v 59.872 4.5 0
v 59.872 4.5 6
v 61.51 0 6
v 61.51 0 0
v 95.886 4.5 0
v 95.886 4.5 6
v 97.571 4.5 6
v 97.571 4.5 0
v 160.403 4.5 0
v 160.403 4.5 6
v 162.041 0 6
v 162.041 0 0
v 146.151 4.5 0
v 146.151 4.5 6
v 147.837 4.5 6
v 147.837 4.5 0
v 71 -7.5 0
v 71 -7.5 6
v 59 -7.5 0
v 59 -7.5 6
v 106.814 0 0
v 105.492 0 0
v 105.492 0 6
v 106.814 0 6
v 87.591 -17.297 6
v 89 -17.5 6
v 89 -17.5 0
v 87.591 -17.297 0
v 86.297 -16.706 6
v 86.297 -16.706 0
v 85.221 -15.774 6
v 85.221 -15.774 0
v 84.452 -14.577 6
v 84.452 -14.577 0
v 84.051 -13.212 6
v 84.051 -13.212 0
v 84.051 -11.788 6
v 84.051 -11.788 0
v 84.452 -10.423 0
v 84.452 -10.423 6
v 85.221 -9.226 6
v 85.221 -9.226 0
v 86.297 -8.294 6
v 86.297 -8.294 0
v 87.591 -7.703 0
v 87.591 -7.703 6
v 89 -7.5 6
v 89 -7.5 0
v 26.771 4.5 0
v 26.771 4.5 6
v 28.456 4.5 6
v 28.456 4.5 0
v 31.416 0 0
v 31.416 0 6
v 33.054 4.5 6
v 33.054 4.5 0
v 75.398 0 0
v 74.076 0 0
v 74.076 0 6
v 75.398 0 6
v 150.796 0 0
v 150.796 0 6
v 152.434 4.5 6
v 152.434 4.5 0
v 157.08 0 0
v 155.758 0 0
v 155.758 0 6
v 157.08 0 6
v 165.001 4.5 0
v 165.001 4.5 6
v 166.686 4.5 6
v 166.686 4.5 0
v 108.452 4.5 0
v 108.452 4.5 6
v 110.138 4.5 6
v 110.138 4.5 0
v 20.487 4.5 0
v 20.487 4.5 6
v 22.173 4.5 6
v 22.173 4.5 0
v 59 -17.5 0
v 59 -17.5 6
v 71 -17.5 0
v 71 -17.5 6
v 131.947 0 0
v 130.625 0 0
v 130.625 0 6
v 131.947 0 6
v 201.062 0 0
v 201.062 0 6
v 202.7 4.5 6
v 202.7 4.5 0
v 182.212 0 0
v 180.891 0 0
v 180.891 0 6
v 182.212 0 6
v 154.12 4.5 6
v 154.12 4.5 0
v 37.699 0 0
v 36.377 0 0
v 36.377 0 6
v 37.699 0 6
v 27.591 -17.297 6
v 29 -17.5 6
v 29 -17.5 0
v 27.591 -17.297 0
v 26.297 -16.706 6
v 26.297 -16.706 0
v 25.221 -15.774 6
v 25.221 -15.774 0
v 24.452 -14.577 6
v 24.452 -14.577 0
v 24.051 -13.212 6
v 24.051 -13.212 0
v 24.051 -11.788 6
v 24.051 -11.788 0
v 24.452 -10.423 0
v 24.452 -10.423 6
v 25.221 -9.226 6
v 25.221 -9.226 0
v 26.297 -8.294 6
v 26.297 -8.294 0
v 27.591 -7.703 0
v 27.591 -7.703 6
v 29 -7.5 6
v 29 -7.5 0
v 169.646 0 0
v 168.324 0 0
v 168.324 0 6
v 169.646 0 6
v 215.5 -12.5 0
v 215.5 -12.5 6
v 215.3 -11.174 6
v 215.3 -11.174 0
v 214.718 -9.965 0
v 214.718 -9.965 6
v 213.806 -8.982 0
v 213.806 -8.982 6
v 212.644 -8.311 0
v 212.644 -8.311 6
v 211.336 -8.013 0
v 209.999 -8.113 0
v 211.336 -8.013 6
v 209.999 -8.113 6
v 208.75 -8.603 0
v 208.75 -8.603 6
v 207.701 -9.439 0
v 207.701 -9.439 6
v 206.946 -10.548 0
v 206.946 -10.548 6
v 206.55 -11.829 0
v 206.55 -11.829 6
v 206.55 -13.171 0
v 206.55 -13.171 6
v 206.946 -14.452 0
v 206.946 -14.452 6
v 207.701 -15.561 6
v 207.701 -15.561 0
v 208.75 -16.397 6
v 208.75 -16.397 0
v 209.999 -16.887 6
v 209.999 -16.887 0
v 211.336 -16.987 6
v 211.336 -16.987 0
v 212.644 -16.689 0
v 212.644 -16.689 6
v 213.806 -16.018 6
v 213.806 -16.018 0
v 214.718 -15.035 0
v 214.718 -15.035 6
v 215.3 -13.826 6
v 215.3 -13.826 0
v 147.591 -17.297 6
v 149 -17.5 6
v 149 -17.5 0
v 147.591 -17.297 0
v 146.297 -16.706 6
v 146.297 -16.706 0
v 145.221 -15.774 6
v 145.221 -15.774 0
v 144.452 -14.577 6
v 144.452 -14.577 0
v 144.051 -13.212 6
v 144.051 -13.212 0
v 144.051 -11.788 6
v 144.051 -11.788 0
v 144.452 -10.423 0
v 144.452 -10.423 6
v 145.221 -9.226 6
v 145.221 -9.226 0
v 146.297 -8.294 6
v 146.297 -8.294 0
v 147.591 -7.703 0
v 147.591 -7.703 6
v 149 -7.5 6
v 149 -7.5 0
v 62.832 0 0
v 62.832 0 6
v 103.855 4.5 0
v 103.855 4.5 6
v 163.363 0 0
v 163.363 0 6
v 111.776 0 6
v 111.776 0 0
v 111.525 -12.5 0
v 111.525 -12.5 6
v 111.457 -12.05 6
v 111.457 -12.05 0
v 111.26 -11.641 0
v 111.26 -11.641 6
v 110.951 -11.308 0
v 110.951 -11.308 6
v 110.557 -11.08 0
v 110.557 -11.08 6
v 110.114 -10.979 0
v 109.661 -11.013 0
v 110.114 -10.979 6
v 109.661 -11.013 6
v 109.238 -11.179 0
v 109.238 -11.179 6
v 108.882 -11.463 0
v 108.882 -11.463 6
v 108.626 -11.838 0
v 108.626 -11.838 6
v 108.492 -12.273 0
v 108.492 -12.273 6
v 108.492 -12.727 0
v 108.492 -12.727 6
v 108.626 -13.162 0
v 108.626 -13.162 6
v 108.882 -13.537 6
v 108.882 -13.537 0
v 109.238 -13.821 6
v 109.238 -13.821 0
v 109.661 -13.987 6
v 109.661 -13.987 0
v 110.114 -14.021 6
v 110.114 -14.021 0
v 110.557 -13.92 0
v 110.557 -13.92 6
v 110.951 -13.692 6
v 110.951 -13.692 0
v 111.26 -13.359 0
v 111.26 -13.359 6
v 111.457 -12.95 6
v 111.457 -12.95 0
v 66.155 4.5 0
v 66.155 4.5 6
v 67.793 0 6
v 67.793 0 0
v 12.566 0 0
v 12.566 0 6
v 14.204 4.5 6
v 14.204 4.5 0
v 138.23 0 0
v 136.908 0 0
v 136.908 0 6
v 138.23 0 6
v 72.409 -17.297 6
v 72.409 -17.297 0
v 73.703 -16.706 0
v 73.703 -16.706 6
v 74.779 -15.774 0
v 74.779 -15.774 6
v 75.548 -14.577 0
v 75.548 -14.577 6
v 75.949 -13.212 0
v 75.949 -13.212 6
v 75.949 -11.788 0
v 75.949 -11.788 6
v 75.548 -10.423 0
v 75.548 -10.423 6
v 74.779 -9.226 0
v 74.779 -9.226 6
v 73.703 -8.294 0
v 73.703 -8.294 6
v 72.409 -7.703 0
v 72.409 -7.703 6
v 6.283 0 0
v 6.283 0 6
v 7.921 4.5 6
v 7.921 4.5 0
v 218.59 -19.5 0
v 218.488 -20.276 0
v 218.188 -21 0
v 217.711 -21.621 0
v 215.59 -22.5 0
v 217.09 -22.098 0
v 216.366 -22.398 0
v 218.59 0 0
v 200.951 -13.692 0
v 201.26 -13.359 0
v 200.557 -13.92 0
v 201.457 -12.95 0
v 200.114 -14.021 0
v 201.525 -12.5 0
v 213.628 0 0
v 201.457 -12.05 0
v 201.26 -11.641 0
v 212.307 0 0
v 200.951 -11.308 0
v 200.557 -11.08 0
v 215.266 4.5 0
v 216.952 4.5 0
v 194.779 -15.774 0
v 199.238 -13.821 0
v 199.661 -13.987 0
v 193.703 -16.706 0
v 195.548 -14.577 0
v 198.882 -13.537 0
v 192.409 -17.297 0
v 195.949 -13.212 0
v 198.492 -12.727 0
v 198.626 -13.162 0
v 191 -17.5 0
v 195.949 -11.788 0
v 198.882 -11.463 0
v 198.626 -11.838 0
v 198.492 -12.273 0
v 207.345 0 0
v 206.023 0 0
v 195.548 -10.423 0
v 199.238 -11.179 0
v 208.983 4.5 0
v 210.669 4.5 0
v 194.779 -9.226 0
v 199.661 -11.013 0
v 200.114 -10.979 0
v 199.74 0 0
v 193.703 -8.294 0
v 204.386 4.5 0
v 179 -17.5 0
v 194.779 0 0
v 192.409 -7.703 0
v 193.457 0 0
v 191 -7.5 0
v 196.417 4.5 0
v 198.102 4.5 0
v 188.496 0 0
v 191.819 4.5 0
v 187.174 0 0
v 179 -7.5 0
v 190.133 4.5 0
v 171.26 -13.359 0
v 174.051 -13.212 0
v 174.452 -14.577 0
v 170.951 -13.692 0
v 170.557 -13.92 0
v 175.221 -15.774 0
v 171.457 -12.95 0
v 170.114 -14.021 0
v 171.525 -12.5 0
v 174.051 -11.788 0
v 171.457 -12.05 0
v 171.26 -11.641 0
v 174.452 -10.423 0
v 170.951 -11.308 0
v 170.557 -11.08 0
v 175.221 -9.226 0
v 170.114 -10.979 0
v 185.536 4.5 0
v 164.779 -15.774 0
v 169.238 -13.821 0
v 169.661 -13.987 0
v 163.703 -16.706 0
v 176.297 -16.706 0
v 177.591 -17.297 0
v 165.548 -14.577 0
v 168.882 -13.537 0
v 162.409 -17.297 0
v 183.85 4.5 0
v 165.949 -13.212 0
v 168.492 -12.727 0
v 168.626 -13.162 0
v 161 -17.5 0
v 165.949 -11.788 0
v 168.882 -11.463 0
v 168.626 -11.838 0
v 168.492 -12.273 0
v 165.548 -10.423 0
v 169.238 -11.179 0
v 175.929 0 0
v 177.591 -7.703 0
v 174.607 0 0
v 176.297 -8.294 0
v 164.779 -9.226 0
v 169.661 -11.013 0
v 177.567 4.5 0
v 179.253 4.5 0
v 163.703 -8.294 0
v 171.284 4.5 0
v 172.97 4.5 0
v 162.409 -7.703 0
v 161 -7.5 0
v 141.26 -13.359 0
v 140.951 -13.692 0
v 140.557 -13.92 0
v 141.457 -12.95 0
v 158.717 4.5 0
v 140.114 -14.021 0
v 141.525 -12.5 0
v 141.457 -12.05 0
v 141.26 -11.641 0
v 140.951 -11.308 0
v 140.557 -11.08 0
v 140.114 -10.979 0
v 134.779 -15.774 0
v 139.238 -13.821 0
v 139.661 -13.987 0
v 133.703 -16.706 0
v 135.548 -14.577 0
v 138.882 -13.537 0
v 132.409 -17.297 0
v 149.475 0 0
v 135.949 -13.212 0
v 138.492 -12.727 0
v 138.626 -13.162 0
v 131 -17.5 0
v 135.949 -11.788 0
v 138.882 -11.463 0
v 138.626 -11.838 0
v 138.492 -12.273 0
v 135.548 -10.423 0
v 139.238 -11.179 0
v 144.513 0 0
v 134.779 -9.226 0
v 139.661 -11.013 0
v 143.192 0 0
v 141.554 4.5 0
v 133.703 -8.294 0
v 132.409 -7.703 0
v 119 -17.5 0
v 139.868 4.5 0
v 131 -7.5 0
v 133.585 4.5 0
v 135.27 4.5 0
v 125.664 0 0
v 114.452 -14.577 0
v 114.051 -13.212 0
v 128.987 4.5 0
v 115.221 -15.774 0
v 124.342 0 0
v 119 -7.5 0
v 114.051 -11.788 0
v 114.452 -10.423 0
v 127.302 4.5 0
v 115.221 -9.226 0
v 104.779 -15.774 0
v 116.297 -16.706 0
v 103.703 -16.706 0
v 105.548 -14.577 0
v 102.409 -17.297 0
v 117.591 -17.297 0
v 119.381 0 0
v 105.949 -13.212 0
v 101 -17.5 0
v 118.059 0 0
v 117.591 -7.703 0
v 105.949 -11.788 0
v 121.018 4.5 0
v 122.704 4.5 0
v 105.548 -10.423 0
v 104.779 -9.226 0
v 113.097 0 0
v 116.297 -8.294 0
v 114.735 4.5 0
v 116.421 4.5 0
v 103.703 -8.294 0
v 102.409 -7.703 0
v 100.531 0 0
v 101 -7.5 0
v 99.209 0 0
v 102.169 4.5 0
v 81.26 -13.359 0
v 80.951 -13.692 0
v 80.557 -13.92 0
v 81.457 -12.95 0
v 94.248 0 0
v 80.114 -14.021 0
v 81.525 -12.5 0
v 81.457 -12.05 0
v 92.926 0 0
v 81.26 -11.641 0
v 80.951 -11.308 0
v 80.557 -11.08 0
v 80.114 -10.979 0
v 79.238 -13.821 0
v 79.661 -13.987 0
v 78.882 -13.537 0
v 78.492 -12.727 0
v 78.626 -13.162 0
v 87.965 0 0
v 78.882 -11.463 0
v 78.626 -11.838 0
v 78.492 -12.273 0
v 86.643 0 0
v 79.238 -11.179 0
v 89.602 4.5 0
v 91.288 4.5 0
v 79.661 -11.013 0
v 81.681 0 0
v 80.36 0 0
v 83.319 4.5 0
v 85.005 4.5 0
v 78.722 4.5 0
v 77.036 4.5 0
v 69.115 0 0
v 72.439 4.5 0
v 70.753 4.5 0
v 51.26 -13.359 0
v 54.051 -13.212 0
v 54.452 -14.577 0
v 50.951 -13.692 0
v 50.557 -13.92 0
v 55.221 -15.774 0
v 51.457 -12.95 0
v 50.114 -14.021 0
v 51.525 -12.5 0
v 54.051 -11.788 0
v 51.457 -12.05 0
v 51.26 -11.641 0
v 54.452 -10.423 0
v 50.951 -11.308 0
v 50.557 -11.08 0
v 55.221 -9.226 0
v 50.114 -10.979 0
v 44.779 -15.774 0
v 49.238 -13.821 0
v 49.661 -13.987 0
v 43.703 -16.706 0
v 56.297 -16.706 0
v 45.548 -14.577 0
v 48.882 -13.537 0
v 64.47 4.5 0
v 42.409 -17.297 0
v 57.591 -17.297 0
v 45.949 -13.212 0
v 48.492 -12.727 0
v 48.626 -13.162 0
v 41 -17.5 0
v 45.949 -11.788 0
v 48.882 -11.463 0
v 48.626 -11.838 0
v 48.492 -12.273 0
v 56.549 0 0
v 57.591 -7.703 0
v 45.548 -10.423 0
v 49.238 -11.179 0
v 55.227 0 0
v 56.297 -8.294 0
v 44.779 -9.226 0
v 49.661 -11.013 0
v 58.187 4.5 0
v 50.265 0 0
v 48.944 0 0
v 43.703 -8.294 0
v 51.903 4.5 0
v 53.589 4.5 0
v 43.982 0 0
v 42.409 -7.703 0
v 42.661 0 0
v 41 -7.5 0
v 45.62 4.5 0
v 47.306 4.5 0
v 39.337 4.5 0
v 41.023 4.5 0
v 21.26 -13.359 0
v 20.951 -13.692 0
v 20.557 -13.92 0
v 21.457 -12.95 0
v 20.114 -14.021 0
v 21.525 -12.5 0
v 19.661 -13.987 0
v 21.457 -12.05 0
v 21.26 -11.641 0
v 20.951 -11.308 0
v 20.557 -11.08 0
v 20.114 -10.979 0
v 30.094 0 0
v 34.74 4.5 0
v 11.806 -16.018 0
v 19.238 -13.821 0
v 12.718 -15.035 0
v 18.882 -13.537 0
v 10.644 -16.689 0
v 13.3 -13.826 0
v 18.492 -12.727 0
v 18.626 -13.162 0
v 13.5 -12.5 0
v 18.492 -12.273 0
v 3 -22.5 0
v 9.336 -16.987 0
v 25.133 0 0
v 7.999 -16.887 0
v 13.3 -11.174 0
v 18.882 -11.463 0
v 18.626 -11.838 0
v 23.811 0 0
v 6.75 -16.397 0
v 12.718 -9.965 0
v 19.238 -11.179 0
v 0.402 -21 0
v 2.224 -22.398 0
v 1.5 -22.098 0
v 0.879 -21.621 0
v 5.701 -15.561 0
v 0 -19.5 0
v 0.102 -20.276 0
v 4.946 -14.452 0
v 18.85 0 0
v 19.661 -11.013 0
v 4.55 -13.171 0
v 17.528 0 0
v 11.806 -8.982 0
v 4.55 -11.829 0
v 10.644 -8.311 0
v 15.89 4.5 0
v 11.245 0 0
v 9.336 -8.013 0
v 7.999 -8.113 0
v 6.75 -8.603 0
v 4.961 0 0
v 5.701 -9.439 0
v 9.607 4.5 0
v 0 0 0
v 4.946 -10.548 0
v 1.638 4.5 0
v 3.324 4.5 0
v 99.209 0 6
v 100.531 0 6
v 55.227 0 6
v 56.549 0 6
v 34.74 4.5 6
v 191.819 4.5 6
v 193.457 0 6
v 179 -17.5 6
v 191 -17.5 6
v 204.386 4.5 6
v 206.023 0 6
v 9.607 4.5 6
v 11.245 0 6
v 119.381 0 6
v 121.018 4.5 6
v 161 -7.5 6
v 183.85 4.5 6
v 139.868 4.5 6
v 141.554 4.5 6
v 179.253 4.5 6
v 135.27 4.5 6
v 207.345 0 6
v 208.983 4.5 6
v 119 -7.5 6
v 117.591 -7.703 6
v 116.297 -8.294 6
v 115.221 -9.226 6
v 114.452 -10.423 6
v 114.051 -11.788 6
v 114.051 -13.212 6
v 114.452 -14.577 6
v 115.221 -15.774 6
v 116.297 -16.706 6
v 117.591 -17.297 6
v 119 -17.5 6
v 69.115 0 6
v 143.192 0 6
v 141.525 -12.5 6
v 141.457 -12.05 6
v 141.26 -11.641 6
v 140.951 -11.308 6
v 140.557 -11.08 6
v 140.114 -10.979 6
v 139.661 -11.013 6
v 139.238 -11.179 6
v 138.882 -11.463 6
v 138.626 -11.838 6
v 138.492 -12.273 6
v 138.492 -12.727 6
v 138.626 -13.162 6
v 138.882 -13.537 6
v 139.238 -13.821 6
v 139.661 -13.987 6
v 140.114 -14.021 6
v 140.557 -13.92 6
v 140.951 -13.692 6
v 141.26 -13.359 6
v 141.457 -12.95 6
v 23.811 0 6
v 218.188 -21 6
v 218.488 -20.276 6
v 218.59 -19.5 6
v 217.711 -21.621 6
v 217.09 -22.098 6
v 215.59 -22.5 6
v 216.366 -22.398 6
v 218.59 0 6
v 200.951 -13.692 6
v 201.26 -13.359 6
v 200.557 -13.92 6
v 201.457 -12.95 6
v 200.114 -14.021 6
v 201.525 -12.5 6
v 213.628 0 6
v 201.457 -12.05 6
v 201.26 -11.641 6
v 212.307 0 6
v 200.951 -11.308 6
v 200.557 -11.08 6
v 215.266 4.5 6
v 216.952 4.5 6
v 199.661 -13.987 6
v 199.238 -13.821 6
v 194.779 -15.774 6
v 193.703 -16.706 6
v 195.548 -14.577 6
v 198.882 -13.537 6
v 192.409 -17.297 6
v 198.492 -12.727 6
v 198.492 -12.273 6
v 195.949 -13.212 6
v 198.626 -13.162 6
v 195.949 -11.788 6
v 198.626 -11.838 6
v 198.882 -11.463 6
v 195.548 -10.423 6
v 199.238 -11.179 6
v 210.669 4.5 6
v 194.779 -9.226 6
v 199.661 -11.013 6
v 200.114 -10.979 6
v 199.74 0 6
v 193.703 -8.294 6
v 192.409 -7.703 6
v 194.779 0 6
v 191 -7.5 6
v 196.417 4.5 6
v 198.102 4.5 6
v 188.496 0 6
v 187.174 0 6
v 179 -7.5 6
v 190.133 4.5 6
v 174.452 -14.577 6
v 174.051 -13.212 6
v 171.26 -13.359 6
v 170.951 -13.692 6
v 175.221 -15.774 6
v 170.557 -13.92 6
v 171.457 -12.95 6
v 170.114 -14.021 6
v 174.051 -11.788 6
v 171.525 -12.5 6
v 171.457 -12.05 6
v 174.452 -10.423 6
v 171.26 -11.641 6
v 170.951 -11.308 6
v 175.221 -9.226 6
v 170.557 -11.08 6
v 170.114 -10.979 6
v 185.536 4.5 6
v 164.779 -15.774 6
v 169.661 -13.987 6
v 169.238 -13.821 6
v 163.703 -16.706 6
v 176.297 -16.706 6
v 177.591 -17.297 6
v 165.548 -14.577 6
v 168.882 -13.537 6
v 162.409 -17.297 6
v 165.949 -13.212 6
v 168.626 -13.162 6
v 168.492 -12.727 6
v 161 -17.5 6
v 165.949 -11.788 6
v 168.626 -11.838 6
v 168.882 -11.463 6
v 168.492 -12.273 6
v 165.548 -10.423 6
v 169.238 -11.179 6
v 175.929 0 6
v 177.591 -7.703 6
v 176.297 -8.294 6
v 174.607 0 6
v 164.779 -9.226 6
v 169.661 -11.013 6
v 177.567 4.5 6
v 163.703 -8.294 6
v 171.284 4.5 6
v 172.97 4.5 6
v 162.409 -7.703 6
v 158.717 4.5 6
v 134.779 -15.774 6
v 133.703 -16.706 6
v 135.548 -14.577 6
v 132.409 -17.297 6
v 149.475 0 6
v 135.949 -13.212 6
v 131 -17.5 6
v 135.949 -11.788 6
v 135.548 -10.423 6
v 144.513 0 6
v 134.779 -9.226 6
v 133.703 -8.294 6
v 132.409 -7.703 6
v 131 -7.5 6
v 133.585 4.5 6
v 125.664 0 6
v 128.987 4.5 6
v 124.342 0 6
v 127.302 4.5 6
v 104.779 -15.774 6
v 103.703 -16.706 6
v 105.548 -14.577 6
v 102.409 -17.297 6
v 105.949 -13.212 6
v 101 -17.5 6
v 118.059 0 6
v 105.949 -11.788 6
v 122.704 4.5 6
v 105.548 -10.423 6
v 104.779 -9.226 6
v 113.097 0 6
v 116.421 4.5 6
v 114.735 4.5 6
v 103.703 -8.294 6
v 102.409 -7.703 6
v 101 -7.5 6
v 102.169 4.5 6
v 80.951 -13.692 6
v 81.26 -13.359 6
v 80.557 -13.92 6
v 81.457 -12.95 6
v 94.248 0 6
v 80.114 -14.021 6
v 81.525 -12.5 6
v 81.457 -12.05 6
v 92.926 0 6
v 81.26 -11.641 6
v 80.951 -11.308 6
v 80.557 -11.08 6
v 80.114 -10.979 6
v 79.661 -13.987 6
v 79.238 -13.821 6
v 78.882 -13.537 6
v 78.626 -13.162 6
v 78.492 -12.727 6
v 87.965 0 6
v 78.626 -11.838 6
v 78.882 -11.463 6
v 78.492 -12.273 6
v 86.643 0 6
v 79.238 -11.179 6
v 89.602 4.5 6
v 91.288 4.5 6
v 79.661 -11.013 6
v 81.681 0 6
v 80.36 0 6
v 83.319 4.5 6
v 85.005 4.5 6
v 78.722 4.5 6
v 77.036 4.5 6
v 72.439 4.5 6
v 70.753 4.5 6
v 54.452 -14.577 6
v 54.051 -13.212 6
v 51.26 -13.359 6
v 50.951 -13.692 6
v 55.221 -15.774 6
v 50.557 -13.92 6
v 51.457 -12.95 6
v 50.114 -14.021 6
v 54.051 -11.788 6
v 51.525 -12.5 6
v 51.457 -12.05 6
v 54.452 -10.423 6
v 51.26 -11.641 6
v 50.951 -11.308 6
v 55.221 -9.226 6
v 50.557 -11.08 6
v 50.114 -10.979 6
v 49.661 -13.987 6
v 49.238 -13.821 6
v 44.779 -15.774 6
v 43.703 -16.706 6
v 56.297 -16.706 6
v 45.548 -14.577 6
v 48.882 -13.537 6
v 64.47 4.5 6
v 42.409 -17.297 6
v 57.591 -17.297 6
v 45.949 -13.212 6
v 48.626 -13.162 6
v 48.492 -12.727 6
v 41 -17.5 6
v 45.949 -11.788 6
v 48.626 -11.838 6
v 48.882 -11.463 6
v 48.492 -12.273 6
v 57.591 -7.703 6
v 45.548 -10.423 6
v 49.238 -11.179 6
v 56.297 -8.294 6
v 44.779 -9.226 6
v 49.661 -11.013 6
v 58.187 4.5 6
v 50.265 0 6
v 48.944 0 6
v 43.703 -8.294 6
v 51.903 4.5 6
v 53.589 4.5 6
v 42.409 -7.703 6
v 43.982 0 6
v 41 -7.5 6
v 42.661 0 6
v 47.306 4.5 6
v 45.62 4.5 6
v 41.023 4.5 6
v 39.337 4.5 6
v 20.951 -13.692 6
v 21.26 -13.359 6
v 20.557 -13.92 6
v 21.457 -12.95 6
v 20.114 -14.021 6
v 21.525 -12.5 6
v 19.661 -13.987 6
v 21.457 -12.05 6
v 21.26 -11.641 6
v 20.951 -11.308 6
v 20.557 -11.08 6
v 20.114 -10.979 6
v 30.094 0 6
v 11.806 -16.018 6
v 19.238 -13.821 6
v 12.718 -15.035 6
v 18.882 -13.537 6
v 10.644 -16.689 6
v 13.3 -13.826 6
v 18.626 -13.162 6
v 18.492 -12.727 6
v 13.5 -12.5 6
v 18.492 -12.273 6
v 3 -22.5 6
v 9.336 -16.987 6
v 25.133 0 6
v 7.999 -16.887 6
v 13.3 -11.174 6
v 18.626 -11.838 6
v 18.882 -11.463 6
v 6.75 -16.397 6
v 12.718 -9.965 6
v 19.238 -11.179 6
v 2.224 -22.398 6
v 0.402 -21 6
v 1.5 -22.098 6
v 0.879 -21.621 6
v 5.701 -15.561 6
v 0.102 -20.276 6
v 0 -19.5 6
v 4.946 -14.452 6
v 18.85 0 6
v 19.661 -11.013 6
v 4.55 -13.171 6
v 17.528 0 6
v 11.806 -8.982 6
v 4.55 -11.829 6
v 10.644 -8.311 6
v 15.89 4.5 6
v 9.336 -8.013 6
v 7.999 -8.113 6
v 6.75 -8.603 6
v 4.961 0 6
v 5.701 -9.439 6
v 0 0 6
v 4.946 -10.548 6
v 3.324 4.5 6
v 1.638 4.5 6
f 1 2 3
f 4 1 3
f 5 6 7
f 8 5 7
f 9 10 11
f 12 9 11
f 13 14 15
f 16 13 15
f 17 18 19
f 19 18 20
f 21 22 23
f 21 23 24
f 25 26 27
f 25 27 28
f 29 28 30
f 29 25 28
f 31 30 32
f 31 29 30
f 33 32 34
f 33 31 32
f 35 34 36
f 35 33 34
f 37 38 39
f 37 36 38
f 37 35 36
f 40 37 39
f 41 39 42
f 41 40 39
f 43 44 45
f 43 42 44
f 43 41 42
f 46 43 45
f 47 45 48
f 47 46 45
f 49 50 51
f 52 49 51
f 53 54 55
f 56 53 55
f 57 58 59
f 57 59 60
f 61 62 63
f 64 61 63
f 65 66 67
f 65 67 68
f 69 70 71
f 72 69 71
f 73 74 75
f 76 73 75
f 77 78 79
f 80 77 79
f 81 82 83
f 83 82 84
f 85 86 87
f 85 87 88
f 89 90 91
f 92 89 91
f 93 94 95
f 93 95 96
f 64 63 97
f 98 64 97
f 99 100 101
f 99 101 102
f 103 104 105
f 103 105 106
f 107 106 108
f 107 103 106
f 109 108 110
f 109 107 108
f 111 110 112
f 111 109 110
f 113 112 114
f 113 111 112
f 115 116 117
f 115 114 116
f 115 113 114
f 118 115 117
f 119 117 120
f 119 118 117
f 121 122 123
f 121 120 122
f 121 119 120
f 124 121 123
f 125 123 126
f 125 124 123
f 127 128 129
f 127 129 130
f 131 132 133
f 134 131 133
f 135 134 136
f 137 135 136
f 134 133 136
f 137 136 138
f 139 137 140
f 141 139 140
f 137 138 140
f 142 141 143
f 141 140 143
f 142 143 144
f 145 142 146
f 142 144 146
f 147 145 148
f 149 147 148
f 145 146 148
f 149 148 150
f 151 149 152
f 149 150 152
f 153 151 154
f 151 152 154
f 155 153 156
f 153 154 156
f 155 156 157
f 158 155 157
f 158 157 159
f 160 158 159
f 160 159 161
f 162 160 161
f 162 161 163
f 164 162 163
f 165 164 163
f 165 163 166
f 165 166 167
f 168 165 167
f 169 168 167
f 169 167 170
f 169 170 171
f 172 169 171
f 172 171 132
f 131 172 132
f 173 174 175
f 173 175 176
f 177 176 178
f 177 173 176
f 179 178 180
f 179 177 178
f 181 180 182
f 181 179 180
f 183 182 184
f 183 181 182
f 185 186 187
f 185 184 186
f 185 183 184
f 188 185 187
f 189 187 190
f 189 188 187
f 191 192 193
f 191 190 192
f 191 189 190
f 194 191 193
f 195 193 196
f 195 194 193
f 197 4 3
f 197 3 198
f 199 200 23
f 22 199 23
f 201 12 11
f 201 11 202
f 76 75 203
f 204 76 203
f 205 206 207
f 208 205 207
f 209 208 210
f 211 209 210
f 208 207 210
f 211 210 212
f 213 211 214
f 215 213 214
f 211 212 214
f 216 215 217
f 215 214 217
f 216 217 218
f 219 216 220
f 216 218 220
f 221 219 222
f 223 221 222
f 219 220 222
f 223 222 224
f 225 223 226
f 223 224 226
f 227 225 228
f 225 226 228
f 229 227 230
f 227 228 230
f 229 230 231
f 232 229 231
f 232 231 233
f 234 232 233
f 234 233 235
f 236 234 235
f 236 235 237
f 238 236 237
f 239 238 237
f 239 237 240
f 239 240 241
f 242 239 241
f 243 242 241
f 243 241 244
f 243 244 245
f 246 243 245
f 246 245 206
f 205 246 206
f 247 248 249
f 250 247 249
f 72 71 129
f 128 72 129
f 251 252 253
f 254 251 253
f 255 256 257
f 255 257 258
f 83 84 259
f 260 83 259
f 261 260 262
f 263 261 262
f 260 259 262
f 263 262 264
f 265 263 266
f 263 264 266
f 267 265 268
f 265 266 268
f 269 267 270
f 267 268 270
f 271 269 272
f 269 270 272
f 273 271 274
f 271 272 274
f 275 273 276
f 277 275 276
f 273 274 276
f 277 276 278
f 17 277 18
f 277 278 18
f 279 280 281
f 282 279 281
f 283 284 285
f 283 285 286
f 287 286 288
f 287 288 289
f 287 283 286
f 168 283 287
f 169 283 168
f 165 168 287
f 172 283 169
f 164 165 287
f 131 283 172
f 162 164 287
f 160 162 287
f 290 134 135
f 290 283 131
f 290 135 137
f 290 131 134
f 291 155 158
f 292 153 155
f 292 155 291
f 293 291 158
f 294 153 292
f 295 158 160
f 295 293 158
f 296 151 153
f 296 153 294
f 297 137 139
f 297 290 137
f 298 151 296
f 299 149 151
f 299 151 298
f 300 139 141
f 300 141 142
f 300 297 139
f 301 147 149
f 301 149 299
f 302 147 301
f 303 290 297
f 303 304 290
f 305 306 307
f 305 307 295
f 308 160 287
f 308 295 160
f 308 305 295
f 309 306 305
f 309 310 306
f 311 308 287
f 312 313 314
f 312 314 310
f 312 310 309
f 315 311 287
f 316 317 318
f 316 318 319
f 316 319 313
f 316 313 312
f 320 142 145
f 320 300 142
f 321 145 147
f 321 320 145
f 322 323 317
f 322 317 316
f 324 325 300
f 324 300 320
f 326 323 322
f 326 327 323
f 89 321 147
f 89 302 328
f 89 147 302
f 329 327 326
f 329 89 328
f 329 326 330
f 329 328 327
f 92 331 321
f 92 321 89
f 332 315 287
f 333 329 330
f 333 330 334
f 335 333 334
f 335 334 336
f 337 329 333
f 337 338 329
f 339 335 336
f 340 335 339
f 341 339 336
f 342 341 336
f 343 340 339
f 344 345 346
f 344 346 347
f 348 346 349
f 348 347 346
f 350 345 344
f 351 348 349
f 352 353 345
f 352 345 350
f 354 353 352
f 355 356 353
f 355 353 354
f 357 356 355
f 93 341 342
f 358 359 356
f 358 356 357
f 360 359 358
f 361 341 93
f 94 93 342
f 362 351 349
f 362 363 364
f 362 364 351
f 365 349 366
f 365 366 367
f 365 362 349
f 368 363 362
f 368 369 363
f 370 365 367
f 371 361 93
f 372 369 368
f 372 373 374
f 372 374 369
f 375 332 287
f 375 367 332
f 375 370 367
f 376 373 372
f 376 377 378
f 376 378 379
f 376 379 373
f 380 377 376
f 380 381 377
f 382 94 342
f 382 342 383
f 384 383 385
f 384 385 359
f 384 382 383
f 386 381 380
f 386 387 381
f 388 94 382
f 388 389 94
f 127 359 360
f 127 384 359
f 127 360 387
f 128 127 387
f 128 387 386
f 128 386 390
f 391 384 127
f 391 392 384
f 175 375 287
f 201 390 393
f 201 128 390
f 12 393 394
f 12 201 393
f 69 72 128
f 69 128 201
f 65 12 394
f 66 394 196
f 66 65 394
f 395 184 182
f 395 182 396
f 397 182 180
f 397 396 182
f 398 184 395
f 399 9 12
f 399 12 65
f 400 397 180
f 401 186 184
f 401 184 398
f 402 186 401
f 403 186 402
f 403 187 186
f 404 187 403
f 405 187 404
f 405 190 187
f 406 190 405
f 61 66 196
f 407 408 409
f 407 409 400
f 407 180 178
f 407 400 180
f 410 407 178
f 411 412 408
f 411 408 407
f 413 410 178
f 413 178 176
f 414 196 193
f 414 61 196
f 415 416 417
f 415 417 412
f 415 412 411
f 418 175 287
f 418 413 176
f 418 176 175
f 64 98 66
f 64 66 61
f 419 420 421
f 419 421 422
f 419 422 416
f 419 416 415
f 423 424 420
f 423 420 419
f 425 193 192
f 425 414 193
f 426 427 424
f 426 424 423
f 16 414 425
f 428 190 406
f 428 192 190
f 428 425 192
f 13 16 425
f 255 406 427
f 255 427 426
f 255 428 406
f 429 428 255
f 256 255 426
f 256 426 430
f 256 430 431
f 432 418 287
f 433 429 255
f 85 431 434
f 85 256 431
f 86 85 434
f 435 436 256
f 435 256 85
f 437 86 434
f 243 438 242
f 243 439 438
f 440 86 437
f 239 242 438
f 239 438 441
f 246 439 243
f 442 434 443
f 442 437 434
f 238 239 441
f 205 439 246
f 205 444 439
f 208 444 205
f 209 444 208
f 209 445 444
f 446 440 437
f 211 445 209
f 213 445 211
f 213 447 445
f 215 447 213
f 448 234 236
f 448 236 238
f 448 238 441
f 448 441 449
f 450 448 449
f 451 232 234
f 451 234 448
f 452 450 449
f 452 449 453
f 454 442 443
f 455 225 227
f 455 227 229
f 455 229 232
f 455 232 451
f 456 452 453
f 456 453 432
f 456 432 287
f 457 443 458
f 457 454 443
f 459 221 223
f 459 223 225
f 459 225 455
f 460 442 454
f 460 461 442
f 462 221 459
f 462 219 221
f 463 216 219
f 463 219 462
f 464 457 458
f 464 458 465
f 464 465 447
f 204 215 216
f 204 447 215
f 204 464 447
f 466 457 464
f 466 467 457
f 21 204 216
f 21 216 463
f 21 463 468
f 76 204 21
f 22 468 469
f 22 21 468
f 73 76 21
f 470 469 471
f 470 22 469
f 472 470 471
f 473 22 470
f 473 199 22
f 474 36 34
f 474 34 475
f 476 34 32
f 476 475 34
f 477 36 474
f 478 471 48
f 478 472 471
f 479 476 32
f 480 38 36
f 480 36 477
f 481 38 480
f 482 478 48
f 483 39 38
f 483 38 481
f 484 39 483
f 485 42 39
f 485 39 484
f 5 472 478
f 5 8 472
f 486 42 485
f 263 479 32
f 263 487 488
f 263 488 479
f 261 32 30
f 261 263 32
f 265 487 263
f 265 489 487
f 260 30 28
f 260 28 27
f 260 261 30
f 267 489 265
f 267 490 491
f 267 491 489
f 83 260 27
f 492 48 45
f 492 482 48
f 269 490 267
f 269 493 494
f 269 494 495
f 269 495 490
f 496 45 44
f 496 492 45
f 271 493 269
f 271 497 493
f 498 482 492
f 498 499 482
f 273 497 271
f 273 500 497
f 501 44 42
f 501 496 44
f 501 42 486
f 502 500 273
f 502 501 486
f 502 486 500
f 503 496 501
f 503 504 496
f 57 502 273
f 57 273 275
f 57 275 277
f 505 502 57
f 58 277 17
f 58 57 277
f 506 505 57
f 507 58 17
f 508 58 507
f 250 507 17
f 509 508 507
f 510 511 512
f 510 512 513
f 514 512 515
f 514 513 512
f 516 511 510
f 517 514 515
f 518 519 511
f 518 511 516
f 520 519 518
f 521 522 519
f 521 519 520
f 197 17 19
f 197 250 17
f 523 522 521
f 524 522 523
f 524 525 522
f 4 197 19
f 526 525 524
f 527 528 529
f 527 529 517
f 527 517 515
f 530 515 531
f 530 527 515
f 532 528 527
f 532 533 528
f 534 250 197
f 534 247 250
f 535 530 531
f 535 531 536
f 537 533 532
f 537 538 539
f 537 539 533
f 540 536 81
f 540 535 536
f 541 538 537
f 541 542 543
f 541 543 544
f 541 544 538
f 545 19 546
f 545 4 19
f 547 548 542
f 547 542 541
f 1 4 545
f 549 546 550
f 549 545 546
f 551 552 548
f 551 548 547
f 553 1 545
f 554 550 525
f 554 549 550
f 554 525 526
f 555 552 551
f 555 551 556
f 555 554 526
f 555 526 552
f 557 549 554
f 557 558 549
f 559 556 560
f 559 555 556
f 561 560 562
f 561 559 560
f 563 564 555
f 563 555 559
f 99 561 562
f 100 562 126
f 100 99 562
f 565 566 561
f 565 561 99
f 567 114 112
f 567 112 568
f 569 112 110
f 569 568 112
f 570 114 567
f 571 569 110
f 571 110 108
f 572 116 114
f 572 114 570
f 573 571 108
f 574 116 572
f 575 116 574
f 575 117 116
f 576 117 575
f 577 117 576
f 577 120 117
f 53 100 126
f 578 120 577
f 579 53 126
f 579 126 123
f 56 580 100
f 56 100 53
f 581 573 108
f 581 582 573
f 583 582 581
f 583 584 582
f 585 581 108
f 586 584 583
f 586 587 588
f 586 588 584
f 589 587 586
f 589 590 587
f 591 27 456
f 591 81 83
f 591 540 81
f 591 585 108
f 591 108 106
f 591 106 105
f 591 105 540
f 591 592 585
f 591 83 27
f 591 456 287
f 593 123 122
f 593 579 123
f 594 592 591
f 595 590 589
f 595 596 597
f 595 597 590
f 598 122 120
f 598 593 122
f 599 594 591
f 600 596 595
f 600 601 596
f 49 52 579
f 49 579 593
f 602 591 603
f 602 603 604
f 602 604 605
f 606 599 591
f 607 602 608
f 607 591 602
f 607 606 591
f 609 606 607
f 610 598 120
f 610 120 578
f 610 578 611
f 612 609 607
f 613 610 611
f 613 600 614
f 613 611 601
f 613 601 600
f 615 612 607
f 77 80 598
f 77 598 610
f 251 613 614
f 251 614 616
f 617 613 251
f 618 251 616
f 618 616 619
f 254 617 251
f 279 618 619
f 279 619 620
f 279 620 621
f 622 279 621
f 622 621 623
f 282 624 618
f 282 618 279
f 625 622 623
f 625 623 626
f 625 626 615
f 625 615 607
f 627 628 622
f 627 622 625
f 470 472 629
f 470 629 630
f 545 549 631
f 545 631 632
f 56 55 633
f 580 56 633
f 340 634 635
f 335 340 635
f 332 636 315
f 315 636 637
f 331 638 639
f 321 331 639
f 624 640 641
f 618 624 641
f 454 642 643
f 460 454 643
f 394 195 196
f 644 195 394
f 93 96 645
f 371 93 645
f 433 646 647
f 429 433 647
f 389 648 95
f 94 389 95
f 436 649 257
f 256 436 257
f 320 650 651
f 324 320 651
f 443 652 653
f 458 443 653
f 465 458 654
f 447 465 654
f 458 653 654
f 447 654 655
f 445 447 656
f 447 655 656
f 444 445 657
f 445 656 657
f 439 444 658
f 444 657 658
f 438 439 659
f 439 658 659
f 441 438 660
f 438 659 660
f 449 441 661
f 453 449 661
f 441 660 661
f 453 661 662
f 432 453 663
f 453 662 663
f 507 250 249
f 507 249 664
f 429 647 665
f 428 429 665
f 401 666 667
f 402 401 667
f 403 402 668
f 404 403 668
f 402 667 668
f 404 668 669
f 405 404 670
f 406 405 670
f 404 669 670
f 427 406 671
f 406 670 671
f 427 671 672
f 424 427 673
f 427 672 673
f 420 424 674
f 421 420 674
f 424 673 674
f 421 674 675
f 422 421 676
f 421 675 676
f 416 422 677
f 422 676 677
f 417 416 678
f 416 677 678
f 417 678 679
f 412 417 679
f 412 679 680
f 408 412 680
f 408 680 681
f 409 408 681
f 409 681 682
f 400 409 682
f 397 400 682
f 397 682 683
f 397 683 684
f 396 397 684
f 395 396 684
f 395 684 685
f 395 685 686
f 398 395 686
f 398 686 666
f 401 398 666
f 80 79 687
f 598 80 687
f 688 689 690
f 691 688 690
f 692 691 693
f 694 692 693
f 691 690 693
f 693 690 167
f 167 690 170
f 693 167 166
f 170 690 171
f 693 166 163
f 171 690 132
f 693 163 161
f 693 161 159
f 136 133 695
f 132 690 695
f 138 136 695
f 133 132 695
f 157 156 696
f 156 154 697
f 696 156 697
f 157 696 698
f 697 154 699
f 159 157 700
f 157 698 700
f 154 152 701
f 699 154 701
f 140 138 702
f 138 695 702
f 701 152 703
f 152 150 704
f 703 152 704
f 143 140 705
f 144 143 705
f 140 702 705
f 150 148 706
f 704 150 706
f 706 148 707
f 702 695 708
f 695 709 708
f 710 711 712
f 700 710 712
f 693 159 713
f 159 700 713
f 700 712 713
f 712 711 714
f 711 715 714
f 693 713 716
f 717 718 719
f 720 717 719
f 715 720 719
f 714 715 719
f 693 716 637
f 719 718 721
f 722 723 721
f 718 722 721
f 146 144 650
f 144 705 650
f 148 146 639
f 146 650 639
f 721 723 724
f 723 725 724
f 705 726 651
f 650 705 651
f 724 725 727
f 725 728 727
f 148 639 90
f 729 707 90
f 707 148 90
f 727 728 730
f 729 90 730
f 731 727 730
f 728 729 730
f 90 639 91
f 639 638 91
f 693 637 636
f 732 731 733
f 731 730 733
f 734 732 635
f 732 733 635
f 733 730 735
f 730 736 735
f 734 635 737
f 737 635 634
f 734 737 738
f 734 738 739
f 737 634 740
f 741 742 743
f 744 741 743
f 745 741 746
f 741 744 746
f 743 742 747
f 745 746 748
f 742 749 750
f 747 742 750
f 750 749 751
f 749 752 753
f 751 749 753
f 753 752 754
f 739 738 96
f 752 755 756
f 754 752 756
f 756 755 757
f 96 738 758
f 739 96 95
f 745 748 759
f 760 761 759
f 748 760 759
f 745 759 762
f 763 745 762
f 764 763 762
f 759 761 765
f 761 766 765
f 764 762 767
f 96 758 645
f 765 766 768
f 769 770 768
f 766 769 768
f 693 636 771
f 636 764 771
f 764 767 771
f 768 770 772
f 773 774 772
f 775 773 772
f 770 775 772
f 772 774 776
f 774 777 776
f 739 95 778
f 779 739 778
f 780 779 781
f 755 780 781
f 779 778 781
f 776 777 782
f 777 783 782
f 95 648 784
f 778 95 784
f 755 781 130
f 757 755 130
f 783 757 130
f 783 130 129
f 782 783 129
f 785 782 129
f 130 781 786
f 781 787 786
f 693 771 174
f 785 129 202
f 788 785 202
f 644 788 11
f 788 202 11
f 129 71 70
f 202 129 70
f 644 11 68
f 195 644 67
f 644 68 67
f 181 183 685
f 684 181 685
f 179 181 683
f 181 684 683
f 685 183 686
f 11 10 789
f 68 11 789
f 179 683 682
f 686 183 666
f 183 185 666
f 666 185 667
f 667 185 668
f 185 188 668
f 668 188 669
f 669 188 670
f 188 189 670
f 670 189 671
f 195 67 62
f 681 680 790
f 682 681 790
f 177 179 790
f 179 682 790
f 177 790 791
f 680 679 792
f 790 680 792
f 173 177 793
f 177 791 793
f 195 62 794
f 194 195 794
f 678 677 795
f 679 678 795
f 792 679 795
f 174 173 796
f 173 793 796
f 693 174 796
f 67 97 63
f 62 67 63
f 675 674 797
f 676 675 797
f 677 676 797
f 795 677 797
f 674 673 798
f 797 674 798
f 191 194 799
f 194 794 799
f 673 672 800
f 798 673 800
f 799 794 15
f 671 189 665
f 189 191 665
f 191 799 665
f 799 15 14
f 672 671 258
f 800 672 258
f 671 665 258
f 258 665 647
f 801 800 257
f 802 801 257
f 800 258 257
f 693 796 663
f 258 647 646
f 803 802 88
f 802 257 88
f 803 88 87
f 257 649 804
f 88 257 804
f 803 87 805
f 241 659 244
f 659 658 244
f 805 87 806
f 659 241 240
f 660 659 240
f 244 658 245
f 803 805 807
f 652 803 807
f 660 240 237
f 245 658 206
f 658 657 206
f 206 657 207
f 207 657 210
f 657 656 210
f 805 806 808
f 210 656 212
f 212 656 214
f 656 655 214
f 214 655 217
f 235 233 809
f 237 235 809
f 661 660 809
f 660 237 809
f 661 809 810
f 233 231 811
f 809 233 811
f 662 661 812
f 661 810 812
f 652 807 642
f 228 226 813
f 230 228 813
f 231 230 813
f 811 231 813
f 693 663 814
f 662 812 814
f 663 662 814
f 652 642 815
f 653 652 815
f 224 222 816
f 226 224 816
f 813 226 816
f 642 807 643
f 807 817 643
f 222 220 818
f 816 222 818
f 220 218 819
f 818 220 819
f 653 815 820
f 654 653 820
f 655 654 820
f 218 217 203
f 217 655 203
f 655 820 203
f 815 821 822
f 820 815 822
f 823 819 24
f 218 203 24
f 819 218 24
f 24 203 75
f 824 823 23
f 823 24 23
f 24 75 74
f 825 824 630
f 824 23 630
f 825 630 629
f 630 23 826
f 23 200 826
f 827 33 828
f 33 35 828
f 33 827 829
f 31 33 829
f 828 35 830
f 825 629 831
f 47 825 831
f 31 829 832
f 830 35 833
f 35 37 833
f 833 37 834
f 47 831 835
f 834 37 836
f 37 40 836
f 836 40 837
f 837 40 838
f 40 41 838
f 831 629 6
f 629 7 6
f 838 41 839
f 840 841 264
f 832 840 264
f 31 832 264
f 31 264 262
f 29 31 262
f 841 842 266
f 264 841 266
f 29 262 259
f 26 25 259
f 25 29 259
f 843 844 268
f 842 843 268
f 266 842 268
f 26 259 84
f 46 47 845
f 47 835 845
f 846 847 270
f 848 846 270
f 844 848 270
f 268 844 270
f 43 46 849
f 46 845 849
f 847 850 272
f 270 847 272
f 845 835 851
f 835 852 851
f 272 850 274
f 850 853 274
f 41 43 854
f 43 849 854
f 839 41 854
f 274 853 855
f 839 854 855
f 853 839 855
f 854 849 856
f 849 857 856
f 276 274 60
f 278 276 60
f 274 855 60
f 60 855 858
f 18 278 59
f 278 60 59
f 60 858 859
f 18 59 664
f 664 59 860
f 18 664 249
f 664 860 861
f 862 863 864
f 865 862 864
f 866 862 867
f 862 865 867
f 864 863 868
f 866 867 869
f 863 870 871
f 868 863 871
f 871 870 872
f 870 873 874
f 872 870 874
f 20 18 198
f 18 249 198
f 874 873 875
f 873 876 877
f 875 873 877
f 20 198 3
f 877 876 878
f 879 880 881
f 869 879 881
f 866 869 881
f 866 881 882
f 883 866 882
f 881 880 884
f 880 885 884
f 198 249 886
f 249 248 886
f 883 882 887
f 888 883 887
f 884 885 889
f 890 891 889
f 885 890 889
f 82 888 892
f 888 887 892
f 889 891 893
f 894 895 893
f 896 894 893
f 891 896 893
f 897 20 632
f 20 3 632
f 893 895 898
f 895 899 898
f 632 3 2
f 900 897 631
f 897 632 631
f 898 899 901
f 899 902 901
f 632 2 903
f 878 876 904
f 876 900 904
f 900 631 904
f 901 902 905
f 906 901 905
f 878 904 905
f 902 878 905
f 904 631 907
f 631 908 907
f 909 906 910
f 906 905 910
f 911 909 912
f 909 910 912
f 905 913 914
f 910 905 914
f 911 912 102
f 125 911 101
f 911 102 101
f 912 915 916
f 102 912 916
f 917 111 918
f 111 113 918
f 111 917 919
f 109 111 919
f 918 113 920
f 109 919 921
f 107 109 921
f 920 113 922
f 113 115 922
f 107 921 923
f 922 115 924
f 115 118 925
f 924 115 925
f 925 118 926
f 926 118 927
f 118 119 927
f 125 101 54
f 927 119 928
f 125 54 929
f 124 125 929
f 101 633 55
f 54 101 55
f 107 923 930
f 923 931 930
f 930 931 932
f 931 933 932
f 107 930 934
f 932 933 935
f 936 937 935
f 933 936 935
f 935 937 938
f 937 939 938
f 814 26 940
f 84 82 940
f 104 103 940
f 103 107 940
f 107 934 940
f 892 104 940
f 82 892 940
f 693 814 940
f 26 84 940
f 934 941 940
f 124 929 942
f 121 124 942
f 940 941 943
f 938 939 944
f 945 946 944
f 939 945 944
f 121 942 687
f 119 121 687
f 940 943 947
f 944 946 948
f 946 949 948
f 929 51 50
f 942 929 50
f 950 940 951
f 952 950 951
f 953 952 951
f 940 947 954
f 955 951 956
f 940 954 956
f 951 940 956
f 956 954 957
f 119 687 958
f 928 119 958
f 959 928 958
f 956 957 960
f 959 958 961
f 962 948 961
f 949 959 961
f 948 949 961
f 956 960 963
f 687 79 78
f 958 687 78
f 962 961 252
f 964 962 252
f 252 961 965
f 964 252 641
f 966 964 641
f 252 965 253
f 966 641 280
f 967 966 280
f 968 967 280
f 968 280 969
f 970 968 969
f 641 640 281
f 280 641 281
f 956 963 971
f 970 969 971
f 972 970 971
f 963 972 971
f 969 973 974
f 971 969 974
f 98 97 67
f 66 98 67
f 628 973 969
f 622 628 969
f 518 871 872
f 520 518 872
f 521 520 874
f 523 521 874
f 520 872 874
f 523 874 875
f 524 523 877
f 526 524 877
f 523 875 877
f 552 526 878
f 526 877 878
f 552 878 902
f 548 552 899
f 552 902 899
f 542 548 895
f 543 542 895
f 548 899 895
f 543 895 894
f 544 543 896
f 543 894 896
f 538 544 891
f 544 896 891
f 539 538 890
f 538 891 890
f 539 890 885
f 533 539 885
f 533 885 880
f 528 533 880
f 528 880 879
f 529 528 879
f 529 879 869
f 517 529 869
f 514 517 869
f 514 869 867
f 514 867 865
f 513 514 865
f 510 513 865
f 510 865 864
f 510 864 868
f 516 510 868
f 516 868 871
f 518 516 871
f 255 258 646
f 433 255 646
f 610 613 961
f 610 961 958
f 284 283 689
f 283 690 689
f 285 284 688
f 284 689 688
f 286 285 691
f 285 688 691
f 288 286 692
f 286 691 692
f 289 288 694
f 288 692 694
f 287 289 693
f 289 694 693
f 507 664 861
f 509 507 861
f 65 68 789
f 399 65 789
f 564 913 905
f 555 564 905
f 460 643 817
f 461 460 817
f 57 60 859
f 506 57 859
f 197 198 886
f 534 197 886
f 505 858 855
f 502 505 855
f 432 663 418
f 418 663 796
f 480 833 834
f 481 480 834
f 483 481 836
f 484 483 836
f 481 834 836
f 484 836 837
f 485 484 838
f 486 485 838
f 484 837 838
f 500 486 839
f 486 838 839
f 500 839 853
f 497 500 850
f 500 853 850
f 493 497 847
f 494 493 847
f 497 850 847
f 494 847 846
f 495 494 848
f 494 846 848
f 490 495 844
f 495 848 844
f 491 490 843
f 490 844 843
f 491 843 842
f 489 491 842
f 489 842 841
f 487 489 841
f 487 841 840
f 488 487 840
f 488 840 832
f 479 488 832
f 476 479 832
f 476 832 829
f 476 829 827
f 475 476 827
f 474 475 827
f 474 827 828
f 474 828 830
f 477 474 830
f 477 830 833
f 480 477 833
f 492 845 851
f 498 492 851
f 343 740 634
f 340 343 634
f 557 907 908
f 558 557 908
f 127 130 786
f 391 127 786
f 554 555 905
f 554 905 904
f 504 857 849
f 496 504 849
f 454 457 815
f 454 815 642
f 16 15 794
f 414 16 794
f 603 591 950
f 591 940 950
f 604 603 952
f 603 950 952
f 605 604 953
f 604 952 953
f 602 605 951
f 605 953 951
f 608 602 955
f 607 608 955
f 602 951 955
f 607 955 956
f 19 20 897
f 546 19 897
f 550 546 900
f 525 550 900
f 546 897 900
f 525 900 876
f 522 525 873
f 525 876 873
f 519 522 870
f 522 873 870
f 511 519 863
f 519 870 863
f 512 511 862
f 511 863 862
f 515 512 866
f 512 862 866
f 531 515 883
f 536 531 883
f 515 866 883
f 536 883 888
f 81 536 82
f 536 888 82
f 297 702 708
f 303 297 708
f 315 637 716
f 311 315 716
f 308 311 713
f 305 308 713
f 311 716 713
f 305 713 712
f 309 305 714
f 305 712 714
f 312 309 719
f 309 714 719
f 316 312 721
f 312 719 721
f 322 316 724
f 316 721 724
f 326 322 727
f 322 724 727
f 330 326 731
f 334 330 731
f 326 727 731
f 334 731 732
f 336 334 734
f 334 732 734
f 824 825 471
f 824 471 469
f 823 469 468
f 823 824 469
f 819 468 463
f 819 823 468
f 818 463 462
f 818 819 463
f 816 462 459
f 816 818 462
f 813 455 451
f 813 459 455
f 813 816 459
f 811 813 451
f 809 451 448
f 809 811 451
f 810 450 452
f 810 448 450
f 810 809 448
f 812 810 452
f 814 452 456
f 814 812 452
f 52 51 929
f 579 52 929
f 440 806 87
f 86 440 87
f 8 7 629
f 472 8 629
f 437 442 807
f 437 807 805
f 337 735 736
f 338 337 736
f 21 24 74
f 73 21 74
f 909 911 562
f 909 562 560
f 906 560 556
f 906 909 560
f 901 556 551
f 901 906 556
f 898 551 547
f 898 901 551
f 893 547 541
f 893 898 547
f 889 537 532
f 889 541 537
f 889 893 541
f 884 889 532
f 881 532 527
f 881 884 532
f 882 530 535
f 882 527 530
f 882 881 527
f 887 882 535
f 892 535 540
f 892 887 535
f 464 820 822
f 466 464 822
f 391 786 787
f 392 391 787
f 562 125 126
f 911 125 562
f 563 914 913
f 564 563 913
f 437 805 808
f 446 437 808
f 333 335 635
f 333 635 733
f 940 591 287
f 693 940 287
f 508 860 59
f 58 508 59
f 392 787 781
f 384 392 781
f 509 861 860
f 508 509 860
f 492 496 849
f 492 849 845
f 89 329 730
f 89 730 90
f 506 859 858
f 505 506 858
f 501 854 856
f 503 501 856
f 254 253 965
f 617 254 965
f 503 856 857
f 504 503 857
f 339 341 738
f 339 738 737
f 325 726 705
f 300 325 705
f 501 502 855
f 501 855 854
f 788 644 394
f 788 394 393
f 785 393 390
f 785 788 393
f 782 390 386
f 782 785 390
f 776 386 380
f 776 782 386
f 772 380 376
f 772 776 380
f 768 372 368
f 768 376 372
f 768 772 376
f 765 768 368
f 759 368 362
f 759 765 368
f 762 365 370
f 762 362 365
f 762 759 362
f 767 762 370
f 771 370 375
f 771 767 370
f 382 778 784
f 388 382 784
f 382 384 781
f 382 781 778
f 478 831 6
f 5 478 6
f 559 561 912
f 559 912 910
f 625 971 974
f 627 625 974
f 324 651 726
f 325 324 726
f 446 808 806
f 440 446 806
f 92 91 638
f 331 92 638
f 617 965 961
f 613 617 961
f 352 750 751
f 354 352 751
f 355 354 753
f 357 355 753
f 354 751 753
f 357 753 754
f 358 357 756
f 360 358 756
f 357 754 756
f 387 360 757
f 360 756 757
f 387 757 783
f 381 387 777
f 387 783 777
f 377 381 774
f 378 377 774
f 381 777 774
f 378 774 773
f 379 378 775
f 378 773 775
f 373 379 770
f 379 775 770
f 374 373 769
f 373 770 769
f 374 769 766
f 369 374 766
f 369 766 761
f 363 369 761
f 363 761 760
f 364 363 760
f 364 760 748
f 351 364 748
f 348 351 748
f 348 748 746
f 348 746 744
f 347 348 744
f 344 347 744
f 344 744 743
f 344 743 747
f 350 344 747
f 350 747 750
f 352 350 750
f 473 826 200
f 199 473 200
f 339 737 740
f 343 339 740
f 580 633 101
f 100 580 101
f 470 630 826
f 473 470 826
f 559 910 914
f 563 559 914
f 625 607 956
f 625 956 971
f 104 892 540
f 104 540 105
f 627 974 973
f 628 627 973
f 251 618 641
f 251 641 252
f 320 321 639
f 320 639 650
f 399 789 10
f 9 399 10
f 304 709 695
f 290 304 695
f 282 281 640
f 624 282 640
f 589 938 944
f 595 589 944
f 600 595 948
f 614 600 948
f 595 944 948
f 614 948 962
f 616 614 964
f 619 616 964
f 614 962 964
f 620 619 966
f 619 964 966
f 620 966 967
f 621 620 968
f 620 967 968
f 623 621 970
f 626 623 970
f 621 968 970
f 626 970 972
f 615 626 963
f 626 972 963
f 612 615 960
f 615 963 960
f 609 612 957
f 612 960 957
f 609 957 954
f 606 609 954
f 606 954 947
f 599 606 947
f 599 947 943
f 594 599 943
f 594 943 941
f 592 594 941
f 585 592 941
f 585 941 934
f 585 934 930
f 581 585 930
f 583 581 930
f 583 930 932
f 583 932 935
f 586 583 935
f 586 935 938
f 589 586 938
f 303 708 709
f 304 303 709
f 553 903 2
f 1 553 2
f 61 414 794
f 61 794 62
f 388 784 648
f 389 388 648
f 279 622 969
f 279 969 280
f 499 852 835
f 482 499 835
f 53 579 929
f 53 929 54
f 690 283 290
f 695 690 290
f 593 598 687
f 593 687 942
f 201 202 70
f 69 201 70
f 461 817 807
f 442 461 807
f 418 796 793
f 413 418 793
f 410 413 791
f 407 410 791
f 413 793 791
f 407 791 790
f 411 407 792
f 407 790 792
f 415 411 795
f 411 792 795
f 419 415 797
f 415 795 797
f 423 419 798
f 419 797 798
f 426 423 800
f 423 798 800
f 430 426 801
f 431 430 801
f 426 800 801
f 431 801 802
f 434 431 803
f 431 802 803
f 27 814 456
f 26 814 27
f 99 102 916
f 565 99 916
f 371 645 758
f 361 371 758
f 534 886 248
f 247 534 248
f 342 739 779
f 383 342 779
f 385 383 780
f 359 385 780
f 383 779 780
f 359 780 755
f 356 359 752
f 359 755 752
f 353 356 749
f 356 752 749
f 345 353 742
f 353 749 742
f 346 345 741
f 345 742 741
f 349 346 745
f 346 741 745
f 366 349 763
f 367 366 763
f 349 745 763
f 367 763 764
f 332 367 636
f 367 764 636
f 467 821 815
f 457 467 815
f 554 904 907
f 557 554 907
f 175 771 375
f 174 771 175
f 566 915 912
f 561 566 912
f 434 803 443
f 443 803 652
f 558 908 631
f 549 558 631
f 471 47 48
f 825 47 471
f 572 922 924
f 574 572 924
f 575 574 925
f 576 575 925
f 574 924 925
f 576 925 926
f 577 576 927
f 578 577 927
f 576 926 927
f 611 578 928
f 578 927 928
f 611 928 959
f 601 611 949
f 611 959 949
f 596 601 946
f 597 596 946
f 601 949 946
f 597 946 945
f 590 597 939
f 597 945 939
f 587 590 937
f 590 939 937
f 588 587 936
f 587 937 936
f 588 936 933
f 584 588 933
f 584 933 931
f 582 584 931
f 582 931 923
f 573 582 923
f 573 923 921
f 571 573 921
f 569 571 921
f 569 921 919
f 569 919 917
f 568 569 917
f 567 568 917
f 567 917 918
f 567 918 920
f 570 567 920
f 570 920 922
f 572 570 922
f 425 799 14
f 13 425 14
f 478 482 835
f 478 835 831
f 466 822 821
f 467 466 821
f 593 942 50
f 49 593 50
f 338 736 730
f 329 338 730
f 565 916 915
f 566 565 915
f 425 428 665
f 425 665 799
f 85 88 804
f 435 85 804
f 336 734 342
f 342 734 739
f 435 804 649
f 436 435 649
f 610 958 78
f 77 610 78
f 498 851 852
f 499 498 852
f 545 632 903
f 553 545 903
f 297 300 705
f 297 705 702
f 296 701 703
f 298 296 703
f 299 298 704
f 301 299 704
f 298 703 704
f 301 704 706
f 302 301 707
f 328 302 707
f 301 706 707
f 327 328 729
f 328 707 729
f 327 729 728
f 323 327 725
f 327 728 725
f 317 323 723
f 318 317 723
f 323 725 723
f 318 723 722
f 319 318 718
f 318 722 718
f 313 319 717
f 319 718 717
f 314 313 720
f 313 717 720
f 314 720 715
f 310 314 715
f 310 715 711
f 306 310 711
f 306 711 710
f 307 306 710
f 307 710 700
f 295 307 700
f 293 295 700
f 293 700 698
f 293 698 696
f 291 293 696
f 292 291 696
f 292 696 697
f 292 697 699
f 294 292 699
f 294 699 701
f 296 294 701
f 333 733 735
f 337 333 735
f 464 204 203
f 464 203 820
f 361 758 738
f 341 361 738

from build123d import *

# Parameters (mm, degrees)
SKETCH_1_W             = 218.58974427
SKETCH_1_H             = 22.5
EXTRUDE_1_DEPTH        = 6
EXTRUDE_2_DEPTH        = 6
PATTERN_LINEAR_1_COUNT = 35
PATTERN_LINEAR_1_PITCH = 6.283185307
SKETCH_3_R             = 1.525
CUT_EXTRUDE_1_DEPTH    = 10
PATTERN_LINEAR_2_COUNT = 7
PATTERN_LINEAR_2_PITCH = 30
FILLET_1_R             = 3
SKETCH_4_R             = 4.5
CUT_EXTRUDE_2_DEPTH    = 10


with BuildPart() as part:
    # 草图1 → 拉伸1 (new body)
    with BuildSketch(Plane.XY):
        with Locations((109.294872135, -11.25)):
            Rectangle(SKETCH_1_W, SKETCH_1_H)
    extrude(amount=EXTRUDE_1_DEPTH)

    # 草图2 → 拉伸2 (add)
    with BuildSketch(Plane.XY.offset(6)):
        Polygon((0, 0), (1.637866054, 4.5), (3.323577771, 4.5), (4.961443825, 0), align=None)
    extrude_2 = extrude(amount=-EXTRUDE_2_DEPTH)

    # 阵列(线性)1: 拉伸2 ×35
    with Locations(*[(i * PATTERN_LINEAR_1_PITCH, 0, 0) for i in range(1, PATTERN_LINEAR_1_COUNT)]):
        add(extrude_2)

    # 草图3 → 切除-拉伸1 (cut)
    with BuildSketch(Plane.XY.offset(6)):
        with Locations((20, -12.5)):
            Circle(SKETCH_3_R)
    cut_extrude_1 = extrude(amount=-CUT_EXTRUDE_1_DEPTH, mode=Mode.SUBTRACT)

    # 阵列(线性)2: 切除-拉伸1 ×7
    with Locations(*[(i * PATTERN_LINEAR_2_PITCH, 0, 0) for i in range(1, PATTERN_LINEAR_2_COUNT)]):
        add(cut_extrude_1, mode=Mode.SUBTRACT)

    # 圆角1
    fillet_1_edges = [part.edges().sort_by_distance(p)[0] for p in [
        (218.58974427, -22.5, 3),
        (0, -22.5, 3),
    ]]
    fillet(fillet_1_edges, radius=FILLET_1_R)

    # 草图4 → 切除-拉伸2 (cut)
    with BuildSketch(Plane.XY.offset(6)):
        with Locations((9, -12.5)):
            Circle(SKETCH_4_R)
        with Locations((211, -12.5)):
            Circle(SKETCH_4_R)
        with BuildLine():
            Line((29, -7.5), (41, -7.5))
            ThreePointArc((41, -7.5), (46, -12.5), (41, -17.5))
            Line((41, -17.5), (29, -17.5))
            ThreePointArc((29, -17.5), (24, -12.5), (29, -7.5))
        make_face()
        with BuildLine():
            Line((71, -7.5), (59, -7.5))
            ThreePointArc((59, -7.5), (54, -12.5), (59, -17.5))
            Line((59, -17.5), (71, -17.5))
            ThreePointArc((71, -17.5), (76, -12.5), (71, -7.5))
        make_face()
        with BuildLine():
            Line((89, -7.5), (101, -7.5))
            ThreePointArc((101, -7.5), (106, -12.5), (101, -17.5))
            Line((101, -17.5), (89, -17.5))
            ThreePointArc((89, -17.5), (84, -12.5), (89, -7.5))
        make_face()
        with BuildLine():
            Line((191, -7.5), (179, -7.5))
            ThreePointArc((179, -7.5), (174, -12.5), (179, -17.5))
            Line((179, -17.5), (191, -17.5))
            ThreePointArc((191, -17.5), (196, -12.5), (191, -7.5))
        make_face()
        with BuildLine():
            Line((149, -7.5), (161, -7.5))
            ThreePointArc((161, -7.5), (166, -12.5), (161, -17.5))
            Line((161, -17.5), (149, -17.5))
            ThreePointArc((149, -17.5), (144, -12.5), (149, -7.5))
        make_face()
        with BuildLine():
            Line((131, -7.5), (119, -7.5))
            ThreePointArc((119, -7.5), (114, -12.5), (119, -17.5))
            Line((119, -17.5), (131, -17.5))
            ThreePointArc((131, -17.5), (136, -12.5), (131, -7.5))
        make_face()
    extrude(amount=-CUT_EXTRUDE_2_DEPTH, mode=Mode.SUBTRACT)


solid = part.part
